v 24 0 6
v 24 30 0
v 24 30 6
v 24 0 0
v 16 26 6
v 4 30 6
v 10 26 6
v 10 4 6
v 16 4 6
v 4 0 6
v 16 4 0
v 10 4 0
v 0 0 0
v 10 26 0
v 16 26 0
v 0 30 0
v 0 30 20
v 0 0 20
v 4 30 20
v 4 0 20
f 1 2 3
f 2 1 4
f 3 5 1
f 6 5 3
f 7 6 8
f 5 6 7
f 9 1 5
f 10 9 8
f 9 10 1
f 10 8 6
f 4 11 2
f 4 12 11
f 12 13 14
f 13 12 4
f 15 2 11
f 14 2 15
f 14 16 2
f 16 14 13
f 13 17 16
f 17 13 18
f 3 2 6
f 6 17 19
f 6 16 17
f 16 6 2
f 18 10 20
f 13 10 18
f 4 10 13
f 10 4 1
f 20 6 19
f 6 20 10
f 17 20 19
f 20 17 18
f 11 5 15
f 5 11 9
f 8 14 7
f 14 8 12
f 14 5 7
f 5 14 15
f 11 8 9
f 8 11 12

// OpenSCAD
// Original MechIntel educational model. CC0-1.0. Units: mm.
// Not a standardized or load-rated component.
$fn=96;
length=24;
width=30;
base=6;
fence=4;
height=20;
slot_width=6;
$fn=64;
difference(){union(){
translate([0,0,0]) cube([length,width,base]);
translate([0,0,base]) cube([fence,width,height-base]);
}
translate([10,4,-1]) cube([slot_width,22,base+2]);
}
